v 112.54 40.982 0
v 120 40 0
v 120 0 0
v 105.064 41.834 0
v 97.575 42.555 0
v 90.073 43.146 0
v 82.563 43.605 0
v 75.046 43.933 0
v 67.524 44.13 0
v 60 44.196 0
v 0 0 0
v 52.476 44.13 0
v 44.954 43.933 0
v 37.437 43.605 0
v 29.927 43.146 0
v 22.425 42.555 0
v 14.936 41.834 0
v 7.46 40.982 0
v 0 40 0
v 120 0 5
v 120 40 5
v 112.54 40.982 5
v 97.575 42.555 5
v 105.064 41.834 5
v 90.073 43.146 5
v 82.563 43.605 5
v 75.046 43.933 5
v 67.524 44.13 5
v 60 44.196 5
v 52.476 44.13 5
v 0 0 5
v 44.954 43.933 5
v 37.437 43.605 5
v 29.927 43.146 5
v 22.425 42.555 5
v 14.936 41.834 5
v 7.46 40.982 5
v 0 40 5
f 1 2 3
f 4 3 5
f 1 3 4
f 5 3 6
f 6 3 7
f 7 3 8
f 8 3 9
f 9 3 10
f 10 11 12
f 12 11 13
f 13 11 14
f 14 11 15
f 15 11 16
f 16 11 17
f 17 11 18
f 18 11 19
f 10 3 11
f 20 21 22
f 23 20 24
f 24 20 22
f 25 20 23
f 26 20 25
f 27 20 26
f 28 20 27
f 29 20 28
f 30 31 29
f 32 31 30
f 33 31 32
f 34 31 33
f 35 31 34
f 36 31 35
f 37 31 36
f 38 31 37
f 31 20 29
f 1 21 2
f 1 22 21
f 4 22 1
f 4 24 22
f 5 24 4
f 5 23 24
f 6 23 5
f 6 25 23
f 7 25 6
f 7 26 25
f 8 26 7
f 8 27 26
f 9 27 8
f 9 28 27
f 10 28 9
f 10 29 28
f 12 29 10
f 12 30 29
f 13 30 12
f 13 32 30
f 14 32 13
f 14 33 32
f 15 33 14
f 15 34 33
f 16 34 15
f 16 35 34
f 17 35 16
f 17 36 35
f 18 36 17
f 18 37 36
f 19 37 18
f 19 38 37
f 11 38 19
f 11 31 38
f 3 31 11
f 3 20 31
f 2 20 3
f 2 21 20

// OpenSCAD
$fn = 32;

// ----------------------------------------------------------------------
// Arc profile plate: crown, 19 points
// ----------------------------------------------------------------------

// --- parameters (mm) ---
bar_l = 120;              // bar length, X
bar_w = 40;               // bar height at the ends, Y
arc_r = 431.12;           // radius of the crown arc
arc_angle = 16;           // crown arc angle, degrees
crown_rise = 4.2;         // rise of the crown over the ends
arc_step = 1;             // sampling step of the crown arc, degrees
plate_t = 5;              // plate thickness, Z

bbox_y = bar_w + crown_rise;  // full height with the crown

profile = [[120, 40], [112.54, 40.982], [105.064, 41.834], [97.575, 42.555], [90.073, 43.146], [82.563, 43.605], [75.046, 43.933], [67.524, 44.13], [60, 44.196], [52.476, 44.13], [44.954, 43.933], [37.437, 43.605], [29.927, 43.146], [22.425, 42.555], [14.936, 41.834], [7.46, 40.982], [0, 40], [0, 0], [120, 0]];  // primary outline, 19 points, counter clockwise

// --- the one profile operation ---
linear_extrude(height = plate_t) polygon(points = profile);
